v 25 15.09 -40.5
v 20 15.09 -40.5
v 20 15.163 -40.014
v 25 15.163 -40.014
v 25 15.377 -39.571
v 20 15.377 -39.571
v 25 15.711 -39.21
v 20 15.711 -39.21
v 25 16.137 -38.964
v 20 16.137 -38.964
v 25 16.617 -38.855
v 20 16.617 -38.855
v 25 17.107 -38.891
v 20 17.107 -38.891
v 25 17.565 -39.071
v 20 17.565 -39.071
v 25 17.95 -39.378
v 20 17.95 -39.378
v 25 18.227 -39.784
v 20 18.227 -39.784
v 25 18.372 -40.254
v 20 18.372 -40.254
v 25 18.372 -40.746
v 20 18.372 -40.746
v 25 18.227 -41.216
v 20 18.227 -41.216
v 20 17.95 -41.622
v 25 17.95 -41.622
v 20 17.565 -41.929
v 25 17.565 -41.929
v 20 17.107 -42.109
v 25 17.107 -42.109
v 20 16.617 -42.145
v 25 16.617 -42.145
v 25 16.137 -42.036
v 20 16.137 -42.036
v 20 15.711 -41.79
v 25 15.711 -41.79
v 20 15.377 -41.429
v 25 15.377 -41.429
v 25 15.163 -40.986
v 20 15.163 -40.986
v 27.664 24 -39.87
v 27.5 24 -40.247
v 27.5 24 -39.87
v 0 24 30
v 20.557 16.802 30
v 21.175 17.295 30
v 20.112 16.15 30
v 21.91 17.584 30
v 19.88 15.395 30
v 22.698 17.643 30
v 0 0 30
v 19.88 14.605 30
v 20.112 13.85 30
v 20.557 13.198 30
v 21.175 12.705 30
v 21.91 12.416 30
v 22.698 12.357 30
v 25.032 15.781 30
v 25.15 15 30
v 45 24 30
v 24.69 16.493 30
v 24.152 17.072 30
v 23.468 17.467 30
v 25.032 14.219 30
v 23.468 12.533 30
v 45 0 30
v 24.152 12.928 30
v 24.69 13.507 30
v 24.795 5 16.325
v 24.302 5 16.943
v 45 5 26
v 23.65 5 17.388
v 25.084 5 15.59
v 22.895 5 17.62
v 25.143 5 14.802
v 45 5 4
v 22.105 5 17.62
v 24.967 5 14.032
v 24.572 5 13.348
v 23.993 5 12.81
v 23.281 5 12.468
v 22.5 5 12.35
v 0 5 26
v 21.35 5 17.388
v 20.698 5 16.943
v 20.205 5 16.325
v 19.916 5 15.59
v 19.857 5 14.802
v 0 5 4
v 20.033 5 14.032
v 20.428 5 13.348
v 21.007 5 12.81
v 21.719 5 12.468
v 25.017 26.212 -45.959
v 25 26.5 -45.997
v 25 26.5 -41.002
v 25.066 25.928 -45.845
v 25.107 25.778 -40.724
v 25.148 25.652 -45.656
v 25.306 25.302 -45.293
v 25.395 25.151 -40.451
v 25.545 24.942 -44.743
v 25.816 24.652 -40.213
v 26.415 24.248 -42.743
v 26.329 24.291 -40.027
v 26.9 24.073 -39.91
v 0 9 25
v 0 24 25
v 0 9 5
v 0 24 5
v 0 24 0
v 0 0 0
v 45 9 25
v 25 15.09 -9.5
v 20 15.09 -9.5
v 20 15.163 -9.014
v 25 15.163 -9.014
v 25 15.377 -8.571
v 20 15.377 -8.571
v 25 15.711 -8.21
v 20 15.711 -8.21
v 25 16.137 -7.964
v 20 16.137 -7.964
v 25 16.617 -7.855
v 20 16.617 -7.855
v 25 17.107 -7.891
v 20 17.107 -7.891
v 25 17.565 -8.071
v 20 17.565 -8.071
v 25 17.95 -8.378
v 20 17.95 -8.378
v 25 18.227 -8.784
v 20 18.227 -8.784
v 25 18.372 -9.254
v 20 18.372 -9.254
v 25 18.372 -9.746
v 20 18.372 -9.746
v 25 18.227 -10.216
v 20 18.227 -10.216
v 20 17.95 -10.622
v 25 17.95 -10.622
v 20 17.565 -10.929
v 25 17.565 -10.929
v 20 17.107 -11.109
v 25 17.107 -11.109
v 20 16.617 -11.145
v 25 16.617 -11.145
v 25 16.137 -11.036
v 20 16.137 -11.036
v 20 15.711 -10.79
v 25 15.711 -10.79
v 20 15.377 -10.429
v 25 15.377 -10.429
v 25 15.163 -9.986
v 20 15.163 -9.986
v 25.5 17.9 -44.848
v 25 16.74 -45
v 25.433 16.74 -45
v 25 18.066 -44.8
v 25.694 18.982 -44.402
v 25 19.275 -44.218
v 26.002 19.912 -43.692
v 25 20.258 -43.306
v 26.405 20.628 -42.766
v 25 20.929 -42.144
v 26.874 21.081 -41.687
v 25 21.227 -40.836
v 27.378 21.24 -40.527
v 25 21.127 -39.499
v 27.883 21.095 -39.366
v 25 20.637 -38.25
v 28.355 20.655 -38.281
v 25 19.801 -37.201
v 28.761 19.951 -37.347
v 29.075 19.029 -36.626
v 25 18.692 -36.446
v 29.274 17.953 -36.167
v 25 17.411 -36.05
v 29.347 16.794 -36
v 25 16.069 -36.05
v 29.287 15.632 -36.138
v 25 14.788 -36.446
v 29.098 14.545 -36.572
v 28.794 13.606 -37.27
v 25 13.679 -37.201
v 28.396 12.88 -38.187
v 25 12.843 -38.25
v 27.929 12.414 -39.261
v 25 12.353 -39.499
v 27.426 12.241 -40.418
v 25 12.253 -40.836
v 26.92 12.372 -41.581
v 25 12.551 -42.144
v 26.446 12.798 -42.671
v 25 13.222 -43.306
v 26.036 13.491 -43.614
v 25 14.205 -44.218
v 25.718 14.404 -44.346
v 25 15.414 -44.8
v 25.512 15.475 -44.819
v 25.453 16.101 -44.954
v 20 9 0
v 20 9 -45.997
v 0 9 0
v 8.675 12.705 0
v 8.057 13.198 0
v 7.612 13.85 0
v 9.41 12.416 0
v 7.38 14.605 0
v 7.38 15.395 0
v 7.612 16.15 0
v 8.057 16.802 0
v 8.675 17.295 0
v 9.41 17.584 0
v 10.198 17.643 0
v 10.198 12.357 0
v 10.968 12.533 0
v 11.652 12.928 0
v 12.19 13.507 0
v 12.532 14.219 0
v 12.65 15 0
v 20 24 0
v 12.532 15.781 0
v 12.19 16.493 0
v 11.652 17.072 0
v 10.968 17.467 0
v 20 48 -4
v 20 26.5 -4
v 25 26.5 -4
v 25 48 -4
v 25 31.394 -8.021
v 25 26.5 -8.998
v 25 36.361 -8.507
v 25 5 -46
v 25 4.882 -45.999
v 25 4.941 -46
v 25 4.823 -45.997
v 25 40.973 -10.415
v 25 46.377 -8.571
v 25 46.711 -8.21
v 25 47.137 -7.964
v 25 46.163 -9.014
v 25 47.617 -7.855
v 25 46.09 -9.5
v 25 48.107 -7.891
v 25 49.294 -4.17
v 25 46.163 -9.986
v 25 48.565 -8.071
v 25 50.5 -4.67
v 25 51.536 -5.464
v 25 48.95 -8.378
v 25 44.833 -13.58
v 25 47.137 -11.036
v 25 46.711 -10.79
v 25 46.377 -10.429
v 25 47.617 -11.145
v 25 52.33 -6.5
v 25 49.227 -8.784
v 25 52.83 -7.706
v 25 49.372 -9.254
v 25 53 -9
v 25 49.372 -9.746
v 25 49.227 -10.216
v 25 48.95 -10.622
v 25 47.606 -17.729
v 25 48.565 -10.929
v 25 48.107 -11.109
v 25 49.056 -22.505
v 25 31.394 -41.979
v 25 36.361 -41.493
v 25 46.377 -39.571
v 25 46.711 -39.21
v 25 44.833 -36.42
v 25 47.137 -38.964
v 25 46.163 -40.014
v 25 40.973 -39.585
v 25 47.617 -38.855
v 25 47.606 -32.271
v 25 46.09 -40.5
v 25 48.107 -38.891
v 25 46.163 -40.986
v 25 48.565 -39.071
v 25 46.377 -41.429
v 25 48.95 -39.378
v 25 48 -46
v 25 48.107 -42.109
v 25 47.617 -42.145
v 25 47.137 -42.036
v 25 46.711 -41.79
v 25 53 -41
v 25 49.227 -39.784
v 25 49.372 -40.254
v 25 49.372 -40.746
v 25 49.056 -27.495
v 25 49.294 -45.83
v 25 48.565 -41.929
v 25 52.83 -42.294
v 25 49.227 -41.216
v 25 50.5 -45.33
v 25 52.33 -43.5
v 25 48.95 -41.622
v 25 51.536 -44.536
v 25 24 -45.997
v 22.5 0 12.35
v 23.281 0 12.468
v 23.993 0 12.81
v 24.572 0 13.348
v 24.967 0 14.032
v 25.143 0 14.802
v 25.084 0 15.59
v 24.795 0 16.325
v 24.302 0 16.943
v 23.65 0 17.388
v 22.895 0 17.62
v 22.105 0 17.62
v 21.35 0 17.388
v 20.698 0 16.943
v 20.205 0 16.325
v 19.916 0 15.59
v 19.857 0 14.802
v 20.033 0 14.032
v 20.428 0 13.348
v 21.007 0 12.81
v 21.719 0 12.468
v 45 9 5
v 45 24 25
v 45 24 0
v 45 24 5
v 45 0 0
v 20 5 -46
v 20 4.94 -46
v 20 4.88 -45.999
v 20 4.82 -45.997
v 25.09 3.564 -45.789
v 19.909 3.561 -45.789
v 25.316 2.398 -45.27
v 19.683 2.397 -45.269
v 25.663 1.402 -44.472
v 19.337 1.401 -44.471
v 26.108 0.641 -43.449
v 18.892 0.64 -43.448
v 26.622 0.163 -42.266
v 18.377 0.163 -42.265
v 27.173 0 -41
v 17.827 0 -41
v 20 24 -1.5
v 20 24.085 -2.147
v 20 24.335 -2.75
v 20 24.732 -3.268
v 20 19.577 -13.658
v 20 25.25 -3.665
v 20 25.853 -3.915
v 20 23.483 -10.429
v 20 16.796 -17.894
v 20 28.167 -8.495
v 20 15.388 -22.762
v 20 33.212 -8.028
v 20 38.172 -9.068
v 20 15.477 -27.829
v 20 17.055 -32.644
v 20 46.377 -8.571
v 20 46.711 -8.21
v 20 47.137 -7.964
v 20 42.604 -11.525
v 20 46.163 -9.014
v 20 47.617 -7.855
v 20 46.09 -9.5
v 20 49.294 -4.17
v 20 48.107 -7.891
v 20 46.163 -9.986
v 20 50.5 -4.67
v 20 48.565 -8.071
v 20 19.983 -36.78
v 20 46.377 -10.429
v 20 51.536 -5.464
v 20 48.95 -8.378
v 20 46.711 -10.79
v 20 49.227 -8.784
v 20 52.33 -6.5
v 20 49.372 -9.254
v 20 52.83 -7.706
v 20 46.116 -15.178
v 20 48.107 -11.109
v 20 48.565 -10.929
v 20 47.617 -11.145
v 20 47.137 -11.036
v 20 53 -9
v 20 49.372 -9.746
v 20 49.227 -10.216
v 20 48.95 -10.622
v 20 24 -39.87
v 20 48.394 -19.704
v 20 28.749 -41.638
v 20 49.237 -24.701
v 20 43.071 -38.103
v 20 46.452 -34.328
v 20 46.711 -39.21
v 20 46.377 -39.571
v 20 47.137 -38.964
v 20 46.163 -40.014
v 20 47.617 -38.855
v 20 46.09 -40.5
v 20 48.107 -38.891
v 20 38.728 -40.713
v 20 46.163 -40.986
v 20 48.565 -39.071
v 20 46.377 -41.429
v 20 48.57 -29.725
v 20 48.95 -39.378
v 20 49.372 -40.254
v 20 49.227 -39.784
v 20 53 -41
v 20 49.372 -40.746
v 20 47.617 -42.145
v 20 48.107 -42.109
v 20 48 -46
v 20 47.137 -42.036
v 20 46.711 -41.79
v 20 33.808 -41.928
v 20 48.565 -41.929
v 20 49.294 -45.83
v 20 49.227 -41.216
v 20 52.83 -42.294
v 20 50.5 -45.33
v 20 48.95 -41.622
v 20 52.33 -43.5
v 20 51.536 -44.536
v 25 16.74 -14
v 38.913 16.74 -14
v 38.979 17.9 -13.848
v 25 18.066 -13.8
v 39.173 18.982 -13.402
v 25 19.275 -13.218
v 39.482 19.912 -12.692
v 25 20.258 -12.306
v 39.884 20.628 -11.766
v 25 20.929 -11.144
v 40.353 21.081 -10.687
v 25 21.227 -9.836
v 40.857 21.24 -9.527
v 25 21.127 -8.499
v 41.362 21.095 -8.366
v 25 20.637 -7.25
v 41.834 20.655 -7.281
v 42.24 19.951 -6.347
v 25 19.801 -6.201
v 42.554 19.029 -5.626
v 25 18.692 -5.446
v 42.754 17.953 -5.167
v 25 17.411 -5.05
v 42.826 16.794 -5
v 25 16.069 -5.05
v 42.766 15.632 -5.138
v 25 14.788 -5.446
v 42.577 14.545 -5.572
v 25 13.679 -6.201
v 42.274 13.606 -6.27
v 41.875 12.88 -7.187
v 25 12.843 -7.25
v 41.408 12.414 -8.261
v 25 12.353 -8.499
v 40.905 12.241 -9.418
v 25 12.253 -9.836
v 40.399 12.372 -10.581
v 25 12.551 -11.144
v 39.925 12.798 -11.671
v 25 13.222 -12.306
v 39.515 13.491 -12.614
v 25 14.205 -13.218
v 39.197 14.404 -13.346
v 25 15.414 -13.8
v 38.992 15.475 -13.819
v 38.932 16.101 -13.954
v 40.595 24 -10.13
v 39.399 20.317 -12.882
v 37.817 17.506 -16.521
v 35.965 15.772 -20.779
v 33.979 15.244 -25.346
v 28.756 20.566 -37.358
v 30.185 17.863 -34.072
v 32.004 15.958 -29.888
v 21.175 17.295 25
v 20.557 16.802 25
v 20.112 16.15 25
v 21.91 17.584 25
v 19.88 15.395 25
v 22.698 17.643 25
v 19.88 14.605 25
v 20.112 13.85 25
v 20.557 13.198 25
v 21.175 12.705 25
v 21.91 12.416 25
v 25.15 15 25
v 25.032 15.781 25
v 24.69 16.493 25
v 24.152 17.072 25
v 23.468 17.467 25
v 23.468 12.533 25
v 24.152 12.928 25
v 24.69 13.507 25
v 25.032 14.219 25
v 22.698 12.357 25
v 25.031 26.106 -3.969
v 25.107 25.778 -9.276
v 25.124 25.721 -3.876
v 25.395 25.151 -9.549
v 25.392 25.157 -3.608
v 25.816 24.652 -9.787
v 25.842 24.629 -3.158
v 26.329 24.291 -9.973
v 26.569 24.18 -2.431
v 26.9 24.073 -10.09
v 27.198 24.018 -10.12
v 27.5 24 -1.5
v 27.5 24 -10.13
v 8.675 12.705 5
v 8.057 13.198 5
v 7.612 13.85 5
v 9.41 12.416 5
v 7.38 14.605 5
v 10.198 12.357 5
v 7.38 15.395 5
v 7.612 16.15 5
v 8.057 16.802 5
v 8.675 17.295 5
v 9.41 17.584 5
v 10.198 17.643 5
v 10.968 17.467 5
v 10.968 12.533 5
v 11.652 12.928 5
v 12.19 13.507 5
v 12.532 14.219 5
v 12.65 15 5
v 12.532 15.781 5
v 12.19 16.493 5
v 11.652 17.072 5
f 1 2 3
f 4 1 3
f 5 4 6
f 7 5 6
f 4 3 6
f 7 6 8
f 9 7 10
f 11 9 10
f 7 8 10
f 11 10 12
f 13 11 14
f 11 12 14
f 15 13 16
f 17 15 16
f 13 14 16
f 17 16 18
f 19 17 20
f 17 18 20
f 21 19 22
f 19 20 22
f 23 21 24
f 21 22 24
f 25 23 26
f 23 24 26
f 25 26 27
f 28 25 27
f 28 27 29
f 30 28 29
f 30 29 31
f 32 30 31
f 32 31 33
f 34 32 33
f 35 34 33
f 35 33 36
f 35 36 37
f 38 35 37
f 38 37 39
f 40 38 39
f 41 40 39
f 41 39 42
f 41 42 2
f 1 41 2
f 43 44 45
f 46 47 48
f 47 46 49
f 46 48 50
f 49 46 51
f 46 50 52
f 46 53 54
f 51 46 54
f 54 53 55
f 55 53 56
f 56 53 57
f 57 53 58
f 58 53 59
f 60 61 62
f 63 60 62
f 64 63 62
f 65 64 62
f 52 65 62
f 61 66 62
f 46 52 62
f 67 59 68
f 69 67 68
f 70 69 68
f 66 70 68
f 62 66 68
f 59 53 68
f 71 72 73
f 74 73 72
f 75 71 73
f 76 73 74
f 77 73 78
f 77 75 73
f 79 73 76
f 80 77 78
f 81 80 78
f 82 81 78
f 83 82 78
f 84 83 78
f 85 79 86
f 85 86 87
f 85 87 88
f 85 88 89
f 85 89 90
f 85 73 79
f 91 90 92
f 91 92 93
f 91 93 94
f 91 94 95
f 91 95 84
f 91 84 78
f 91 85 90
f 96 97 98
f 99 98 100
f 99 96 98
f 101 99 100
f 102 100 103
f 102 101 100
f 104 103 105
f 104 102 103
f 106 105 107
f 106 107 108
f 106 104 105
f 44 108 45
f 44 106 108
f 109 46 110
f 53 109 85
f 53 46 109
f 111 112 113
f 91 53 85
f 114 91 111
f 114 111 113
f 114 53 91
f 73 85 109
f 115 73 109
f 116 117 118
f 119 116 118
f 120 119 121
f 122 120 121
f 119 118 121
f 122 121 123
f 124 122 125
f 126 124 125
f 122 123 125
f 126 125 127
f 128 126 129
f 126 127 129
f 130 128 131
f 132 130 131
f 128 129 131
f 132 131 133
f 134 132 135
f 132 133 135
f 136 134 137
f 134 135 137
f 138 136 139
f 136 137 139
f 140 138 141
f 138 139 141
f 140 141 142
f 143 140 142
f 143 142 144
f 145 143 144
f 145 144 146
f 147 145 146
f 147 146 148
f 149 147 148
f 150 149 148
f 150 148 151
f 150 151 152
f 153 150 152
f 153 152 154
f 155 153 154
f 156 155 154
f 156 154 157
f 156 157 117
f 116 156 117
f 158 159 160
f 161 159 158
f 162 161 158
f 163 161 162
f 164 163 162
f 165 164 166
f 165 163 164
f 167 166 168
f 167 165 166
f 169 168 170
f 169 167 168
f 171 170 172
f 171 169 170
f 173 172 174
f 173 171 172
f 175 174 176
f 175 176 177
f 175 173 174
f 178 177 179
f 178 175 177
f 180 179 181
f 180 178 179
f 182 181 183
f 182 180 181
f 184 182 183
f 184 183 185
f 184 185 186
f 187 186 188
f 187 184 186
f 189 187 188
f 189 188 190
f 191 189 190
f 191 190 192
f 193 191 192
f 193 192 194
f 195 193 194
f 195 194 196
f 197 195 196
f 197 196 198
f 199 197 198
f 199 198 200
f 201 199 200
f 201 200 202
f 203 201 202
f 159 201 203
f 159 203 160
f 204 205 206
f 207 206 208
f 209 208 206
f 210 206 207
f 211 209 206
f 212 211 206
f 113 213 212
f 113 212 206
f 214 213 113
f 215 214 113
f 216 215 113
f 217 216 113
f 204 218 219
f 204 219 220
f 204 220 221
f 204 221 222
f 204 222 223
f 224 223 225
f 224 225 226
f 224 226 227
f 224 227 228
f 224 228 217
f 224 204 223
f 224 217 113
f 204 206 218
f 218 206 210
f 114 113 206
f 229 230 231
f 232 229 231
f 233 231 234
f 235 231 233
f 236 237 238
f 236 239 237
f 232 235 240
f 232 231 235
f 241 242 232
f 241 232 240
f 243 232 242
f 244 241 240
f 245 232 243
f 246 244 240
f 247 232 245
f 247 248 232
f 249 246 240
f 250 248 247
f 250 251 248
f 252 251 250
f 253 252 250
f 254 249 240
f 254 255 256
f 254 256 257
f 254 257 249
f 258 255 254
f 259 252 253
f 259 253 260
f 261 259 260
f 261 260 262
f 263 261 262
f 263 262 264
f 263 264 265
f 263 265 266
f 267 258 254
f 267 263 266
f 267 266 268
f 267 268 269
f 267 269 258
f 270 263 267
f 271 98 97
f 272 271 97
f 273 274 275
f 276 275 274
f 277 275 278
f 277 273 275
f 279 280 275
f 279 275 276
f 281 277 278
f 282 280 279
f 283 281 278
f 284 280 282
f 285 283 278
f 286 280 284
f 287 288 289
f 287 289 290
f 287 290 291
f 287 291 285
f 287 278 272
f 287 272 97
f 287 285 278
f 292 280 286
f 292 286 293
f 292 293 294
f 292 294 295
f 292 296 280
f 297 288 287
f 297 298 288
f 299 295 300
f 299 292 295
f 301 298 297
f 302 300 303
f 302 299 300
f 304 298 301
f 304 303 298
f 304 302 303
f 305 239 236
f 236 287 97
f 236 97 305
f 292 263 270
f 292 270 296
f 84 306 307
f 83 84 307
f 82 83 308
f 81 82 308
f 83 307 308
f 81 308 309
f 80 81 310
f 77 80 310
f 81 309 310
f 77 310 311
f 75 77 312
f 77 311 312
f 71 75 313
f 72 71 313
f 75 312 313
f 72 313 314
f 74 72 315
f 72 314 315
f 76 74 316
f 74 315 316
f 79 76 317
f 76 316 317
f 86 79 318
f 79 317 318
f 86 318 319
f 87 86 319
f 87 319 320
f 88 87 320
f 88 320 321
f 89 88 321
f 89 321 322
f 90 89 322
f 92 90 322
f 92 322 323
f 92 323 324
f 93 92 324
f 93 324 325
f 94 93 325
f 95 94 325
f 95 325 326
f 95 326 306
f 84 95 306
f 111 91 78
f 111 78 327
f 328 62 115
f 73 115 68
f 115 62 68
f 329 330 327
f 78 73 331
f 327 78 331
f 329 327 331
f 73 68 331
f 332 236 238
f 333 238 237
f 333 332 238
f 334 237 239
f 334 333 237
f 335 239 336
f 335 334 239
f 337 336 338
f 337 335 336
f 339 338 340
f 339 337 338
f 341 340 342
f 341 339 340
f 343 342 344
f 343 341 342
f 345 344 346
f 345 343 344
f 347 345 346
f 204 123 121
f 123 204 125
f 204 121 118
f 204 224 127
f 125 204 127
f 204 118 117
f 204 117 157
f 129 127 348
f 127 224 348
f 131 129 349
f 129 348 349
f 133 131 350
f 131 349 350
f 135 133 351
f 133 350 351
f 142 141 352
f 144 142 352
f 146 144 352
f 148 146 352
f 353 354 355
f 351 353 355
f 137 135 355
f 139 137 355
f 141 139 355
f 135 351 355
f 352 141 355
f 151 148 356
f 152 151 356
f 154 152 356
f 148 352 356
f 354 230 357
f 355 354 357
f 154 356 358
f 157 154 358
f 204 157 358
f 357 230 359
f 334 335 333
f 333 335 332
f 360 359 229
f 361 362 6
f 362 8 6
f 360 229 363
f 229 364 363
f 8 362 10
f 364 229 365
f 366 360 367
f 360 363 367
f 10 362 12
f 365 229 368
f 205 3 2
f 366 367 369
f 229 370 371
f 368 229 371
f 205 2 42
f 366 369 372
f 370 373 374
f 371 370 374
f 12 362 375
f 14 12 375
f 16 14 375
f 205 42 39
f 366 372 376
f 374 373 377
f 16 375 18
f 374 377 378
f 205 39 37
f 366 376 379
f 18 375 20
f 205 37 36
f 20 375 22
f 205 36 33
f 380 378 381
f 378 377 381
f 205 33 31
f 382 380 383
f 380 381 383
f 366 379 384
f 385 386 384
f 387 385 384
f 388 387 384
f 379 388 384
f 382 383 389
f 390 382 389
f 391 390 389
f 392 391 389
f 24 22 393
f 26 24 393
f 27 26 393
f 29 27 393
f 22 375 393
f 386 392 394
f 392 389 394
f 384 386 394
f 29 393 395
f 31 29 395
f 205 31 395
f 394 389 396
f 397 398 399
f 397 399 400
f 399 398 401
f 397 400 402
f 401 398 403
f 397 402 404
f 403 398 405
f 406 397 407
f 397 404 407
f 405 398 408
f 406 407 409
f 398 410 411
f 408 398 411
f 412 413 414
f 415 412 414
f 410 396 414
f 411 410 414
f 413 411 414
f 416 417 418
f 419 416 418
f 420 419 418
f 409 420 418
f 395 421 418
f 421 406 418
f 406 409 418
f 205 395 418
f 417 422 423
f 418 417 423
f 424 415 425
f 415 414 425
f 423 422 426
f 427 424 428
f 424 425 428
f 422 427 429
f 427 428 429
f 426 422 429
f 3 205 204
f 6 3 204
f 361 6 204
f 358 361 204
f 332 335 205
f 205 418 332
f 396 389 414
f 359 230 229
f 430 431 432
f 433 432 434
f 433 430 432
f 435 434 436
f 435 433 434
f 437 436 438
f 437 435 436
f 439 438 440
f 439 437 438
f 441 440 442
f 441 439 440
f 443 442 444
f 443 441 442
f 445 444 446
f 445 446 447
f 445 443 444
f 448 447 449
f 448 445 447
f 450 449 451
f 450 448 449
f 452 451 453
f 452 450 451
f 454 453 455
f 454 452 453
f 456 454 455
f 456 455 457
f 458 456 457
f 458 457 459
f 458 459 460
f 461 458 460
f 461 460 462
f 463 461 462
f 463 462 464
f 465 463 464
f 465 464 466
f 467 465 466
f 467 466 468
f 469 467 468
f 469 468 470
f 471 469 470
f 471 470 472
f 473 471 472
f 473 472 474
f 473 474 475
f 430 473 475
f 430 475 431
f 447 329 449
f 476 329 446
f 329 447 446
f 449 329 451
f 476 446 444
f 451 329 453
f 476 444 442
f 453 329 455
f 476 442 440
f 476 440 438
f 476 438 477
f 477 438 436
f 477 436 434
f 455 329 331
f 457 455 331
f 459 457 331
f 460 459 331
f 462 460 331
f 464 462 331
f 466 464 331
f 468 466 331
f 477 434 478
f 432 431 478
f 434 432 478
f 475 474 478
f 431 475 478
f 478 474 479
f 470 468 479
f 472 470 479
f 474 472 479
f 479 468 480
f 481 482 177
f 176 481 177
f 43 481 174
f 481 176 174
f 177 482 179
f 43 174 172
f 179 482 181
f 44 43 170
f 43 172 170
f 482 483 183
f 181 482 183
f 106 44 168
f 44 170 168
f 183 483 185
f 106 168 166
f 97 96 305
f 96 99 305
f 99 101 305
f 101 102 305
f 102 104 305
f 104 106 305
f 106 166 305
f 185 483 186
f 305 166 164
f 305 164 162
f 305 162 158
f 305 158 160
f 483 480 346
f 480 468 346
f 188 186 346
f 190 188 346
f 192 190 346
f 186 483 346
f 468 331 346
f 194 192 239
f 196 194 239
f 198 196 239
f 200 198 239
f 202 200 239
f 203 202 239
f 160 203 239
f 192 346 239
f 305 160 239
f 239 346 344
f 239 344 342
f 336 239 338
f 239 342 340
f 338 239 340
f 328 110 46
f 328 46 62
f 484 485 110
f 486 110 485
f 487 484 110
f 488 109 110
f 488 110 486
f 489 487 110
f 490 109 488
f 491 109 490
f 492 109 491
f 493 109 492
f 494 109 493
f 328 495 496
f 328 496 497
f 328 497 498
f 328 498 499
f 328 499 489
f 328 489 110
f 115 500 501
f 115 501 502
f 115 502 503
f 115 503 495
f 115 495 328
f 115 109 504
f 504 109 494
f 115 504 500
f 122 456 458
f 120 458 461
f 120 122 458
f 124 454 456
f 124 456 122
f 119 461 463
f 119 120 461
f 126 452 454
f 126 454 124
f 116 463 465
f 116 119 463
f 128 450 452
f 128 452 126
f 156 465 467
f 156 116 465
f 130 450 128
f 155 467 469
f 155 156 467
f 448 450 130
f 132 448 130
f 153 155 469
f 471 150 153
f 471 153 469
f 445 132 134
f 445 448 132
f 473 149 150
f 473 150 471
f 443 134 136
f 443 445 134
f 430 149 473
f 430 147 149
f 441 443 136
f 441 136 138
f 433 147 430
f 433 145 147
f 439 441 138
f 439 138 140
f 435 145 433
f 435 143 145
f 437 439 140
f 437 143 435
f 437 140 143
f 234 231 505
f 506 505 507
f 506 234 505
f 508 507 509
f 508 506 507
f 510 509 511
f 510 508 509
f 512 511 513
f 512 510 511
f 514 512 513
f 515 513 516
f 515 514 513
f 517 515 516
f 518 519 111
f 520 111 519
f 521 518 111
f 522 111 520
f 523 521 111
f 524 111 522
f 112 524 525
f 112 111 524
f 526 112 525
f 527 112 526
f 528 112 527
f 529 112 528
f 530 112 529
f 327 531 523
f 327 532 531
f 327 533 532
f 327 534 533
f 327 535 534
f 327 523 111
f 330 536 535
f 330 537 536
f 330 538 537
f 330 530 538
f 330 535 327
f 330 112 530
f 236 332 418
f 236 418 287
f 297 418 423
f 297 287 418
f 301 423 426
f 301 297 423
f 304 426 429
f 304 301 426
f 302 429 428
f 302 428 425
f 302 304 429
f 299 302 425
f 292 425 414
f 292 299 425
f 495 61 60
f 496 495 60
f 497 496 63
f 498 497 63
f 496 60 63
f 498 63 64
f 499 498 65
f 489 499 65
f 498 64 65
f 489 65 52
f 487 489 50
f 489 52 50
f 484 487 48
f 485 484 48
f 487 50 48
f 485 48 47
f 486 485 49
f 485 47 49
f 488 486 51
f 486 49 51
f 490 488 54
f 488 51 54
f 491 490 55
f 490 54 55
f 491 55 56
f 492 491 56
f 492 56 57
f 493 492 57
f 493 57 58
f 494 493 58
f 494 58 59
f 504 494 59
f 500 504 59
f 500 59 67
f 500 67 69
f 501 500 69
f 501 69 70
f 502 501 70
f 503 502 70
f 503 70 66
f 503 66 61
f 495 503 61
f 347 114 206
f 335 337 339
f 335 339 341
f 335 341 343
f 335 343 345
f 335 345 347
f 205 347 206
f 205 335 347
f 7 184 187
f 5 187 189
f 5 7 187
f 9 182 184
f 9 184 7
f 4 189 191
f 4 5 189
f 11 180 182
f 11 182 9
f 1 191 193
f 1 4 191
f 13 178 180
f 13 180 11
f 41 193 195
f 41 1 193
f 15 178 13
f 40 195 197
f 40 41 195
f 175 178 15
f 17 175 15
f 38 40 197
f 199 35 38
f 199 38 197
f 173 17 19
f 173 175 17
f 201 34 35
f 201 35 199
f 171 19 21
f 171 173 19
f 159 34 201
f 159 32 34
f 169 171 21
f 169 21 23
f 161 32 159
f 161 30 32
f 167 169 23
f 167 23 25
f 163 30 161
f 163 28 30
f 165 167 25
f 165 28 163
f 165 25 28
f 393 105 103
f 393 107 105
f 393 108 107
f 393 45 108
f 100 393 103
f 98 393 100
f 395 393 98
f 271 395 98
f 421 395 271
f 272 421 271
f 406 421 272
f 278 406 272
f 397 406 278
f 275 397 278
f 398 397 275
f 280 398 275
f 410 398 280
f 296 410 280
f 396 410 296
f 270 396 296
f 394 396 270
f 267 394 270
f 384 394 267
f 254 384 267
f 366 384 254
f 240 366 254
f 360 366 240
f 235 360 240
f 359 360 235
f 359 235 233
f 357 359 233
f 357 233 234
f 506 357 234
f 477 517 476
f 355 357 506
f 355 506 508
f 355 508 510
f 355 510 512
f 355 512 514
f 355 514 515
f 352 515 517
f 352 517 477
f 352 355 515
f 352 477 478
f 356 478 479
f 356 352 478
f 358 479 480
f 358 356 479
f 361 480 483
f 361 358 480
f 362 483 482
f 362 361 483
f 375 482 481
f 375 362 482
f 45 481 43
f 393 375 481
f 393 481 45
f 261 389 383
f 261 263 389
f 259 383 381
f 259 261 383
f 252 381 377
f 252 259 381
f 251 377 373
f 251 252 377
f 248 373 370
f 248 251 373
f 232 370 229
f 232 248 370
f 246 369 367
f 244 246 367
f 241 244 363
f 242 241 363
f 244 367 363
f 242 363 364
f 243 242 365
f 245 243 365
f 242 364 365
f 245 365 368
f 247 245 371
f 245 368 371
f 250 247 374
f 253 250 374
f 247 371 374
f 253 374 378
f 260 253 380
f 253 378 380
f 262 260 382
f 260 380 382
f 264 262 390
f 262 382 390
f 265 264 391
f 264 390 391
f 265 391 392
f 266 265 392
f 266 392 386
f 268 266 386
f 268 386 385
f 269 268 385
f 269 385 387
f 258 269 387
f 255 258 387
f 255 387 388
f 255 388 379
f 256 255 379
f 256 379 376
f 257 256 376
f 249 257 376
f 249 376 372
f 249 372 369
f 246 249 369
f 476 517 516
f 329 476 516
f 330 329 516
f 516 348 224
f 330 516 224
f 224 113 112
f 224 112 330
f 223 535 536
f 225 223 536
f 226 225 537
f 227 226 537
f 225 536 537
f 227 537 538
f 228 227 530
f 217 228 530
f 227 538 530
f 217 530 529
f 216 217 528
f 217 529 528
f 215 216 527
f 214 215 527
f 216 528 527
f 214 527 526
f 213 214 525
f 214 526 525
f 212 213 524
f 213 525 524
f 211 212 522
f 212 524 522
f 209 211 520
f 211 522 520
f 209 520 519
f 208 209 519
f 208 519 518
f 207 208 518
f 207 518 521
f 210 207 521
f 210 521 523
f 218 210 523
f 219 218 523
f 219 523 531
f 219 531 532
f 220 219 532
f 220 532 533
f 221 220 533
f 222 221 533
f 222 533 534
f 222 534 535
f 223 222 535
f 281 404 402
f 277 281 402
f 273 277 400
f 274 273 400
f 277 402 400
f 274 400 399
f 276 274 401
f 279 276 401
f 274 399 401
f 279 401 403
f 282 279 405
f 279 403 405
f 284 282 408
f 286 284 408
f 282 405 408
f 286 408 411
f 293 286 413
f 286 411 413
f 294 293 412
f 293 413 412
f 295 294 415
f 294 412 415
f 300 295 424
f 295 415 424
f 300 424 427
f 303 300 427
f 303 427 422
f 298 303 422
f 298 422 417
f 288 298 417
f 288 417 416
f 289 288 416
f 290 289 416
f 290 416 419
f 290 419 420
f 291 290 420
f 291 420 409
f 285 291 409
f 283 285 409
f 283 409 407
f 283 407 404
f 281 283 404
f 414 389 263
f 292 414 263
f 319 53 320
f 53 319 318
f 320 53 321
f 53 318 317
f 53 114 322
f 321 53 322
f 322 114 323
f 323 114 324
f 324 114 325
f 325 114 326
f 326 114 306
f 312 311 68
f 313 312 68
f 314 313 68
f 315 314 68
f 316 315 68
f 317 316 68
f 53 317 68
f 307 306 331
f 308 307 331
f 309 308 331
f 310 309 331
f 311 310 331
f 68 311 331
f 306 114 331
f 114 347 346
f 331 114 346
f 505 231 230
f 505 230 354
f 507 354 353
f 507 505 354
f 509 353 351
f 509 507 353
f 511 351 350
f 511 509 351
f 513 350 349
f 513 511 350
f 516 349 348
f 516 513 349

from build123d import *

# Parameters (mm, degrees)
SKETCH1_W               = 45
SKETCH1_H               = 24
BOSS_EXTRUDE1_DEPTH     = 5
SKETCH2_W               = 5
SKETCH2_H               = 24
BOSS_EXTRUDE2_DEPTH     = 46
SKETCH3_W               = 45
SKETCH3_H               = 5
BOSS_EXTRUDE3_DEPTH     = 20
CHAMFER2_SIZE           = 45.996850945
CHAMFER2_SIZE_2         = 20
CHAMFER3_SIZE2          = 45.996850945
CHAMFER3_SIZE           = 20
SKETCH4_W               = 5
SKETCH4_H               = 42
BOSS_EXTRUDE4_DEPTH     = 29
CUT_EXTRUDE1_DEPTH      = 75.498322129
CUT_EXTRUDE1_DEPTH_BACK = 75.498322129
SKETCH6_R               = 17
SKETCH7_W               = 46
SKETCH7_H               = 44
CUT_EXTRUDE2_DEPTH      = 75.498322129
SKETCH8_R               = 1.65
CUT_EXTRUDE3_DEPTH      = 75.498322129
SKETCH9_R               = 4.5
CUT_EXTRUDE4_DEPTH      = 75.498322129
FILLET1_R               = 5
SKETCH10_R              = 2.65
CUT_EXTRUDE5_DEPTH      = 10
SKETCH11_R              = 2.65
CUT_EXTRUDE6_DEPTH      = 10
SKETCH12_W              = 45
SKETCH12_H              = 5
BOSS_EXTRUDE5_DEPTH     = 24
SKETCH13_R              = 2.65
CUT_EXTRUDE7_DEPTH      = 10
CUT_EXTRUDE8_DEPTH      = 84.366660003
CUT_EXTRUDE8_DEPTH_BACK = 84.366660003
FILLET2_R               = 2.5


# Some blends are built 0.0001 mm under size
with BuildPart() as part:
    # Sketch1 → Boss-Extrude1 (new body)
    with BuildSketch(Plane.XY):
        with Locations((22.5, 12)):
            Rectangle(SKETCH1_W, SKETCH1_H)
    extrude(amount=BOSS_EXTRUDE1_DEPTH)

    # Sketch2 → Boss-Extrude2 (add)
    with BuildSketch(Plane(origin=(0, 0, 0), x_dir=(-1, 0, 0), z_dir=(0, 0, -1))):
        with Locations((-22.5, 12)):
            Rectangle(SKETCH2_W, SKETCH2_H)
    extrude(amount=BOSS_EXTRUDE2_DEPTH)

    # Sketch3 → Boss-Extrude3 (add)
    with BuildSketch(Plane.XY.offset(5)):
        with Locations((22.5, 2.5)):
            Rectangle(SKETCH3_W, SKETCH3_H)
    extrude(amount=BOSS_EXTRUDE3_DEPTH)

    # Chamfer2
    # the kernel refuses this chamfer: 45.996850945, 20 mm, written as the material it adds along each edge
    with BuildSketch(Plane(origin=(25, 0, 0), x_dir=(-0.015383761930769691, 0, -0.9998816629325978), z_dir=(0, 1, 0))) as chamfer2_piece_1_section:
        Polygon((CHAMFER2_SIZE * 0.999881662927, -CHAMFER2_SIZE * 0.0153837619307), (-CHAMFER2_SIZE_2 * 0.0153837619308, -CHAMFER2_SIZE_2 * 0.999881662933), (0, 0), align=None)
    chamfer2_piece_1 = extrude(amount=24, mode=Mode.PRIVATE)
    chamfer2_piece_1 = split(chamfer2_piece_1, bisect_by=Plane(origin=(45, 12, -15.645189054), z_dir=(-1, 0, 0)), keep=Keep.TOP, mode=Mode.PRIVATE)
    add(chamfer2_piece_1)

    # Chamfer3
    chamfer3_edges = [part.edges().sort_by_distance(p)[0] for p in [
        (20, 12, 0),
    ]]
    chamfer3_side = [part.faces().sort_by_distance(p)[0] for p in [
        (19.6, 12, 0),
    ]]
    chamfer(chamfer3_edges, length=CHAMFER3_SIZE - 0.0001, length2=CHAMFER3_SIZE2 - 0.0001, reference=chamfer3_side[0])  # a hair under: the kernel refuses the full size

    # Sketch4 → Boss-Extrude4 (add)
    with BuildSketch(Plane(origin=(0, 24, 0), x_dir=(1, 0, 0), z_dir=(0, 1, 0))):
        with Locations((22.5, 25)):
            Rectangle(SKETCH4_W, SKETCH4_H)
    extrude(amount=BOSS_EXTRUDE4_DEPTH)

    # Sketch6 → Cut-Extrude1 (cut, two sides: drawn at the far end of the back side and taken through both)
    with BuildSketch(Plane(origin=(25, 0, 0), x_dir=(0, 0, -1), z_dir=(1, 0, 0)).offset(-CUT_EXTRUDE1_DEPTH_BACK)):
        with Locations(Location((25, 32.24, 0), (0, 0, 331.00679558))):
            Circle(SKETCH6_R)
    extrude(amount=CUT_EXTRUDE1_DEPTH + CUT_EXTRUDE1_DEPTH_BACK, mode=Mode.SUBTRACT)

    # Sketch7 → Cut-Extrude2 (cut, through all)
    with BuildSketch(Plane.ZY.offset(-20)):
        with Locations((-23, 31)):
            Rectangle(SKETCH7_W, SKETCH7_H)
    extrude(amount=CUT_EXTRUDE2_DEPTH, mode=Mode.SUBTRACT)

    # Sketch8 → Cut-Extrude3 (cut, through all)
    with BuildSketch(Plane.ZY.offset(-20)):
        with Locations(Location((-40.5, 47.74, 0), (0, 0, 270))):
            Circle(SKETCH8_R)
        with Locations(Location((-9.5, 47.74, 0), (0, 0, 270))):
            Circle(SKETCH8_R)
        with Locations(Location((-9.5, 16.74, 0), (0, 0, 270))):
            Circle(SKETCH8_R)
        with Locations(Location((-40.5, 16.74, 0), (0, 0, 270))):
            Circle(SKETCH8_R)
    extrude(amount=-CUT_EXTRUDE3_DEPTH, mode=Mode.SUBTRACT)

    # Sketch9 → Cut-Extrude4 (cut, through all)
    with BuildSketch(Plane(origin=(25, 0, 0), x_dir=(0, 0, -1), z_dir=(1, 0, 0))):
        with Locations((9.5, 16.74)):
            Circle(SKETCH9_R)
        with Locations((40.5, 16.74)):
            Circle(SKETCH9_R)
    extrude(amount=CUT_EXTRUDE4_DEPTH, mode=Mode.SUBTRACT)

    # Fillet1
    fillet1_edges = [part.edges().sort_by_distance(p)[0] for p in [
        (22.5, 0, -46),
        (22.5, 53, -4),
        (22.5, 53, -46),
    ]]
    fillet(fillet1_edges, radius=FILLET1_R)

    # Sketch10 → Cut-Extrude5 (cut)
    with BuildSketch(Plane.XZ):
        with Locations(Location((22.5, 15, 0), (0, 0, 270))):
            Circle(SKETCH10_R)
    extrude(amount=-CUT_EXTRUDE5_DEPTH, mode=Mode.SUBTRACT)

    # Sketch11 → Cut-Extrude6 (cut)
    with BuildSketch(Plane.XY.offset(5)):
        with Locations((10, 15)):
            Circle(SKETCH11_R)
    extrude(amount=-CUT_EXTRUDE6_DEPTH, mode=Mode.SUBTRACT)

    # Sketch12 → Boss-Extrude5 (add)
    with BuildSketch(Plane(origin=(0, 0, 0), x_dir=(1, 0, 0), z_dir=(0, 1, 0))):
        with Locations((22.5, -27.5)):
            Rectangle(SKETCH12_W, SKETCH12_H)
    extrude(amount=BOSS_EXTRUDE5_DEPTH)

    # Sketch13 → Cut-Extrude7 (cut)
    with BuildSketch(Plane.XY.offset(30)):
        with Locations((22.5, 15)):
            Circle(SKETCH13_R)
    extrude(amount=-CUT_EXTRUDE7_DEPTH, mode=Mode.SUBTRACT)

    # Sketch14 → Cut-Extrude8 (cut, two sides: drawn at the far end of the back side and taken through both)
    with BuildSketch(Plane(origin=(45, 0, 0), x_dir=(0, 0, -1), z_dir=(1, 0, 0)).offset(-CUT_EXTRUDE8_DEPTH_BACK)):
        Polygon((-25, 5), (-26, 5), (-25, 9), align=None)
        Polygon((-5, 5), (-4, 5), (-5, 9), align=None)
    extrude(amount=CUT_EXTRUDE8_DEPTH + CUT_EXTRUDE8_DEPTH_BACK, mode=Mode.SUBTRACT)

    # Fillet2
    # the kernel refuses this fillet: 2.5 mm, written as the material it adds along each edge
    with BuildSketch(Plane(origin=(25, 24, -4), x_dir=(0, 0, 1), z_dir=(-1, 0, 0))) as fillet2_piece_1:
        with BuildLine():
            CenterArc((FILLET2_R, FILLET2_R), FILLET2_R, 180, 90)
            Line((0, FILLET2_R), (0, 0))
            Line((0, 0), (FILLET2_R, 0))
        make_face()
    extrude(amount=5)
    with BuildSketch(Plane(origin=(25, 24, -16.380487567), x_dir=(1, 0, 0), z_dir=(0, 0, 1))) as fillet2_piece_2_section:
        with BuildLine():
            CenterArc((FILLET2_R, FILLET2_R), FILLET2_R, 180, 90)
            Line((0, FILLET2_R), (0, 0))
            Line((0, 0), (FILLET2_R, 0))
        make_face()
    fillet2_piece_2 = extrude(amount=12.380487567, mode=Mode.PRIVATE)
    fillet2_piece_2 = fillet2_piece_2 - Plane(origin=(25.580464588, 32.24, -25), x_dir=(0, -0.48470588235146506, -0.8746772019516044), z_dir=(1, 0, 0)) * Cylinder(17, 35, mode=Mode.PRIVATE)
    add(fillet2_piece_2)
    with BuildSketch(Plane(origin=(25, 24, -52.246850945), x_dir=(0, 1, 0), z_dir=(0, 0, 1))) as fillet2_piece_3_section:
        with BuildLine():
            CenterArc((FILLET2_R, -FILLET2_R), FILLET2_R, 90, 90)
            Line((0, -FILLET2_R), (0, 0))
            Line((0, 0), (FILLET2_R, 0))
        make_face()
    fillet2_piece_3 = extrude(amount=18.627338512, mode=Mode.PRIVATE)
    fillet2_piece_3 = split(fillet2_piece_3, bisect_by=Plane(origin=(25.437853411, 24.621520757, -46), z_dir=(0, 0, 1)), keep=Keep.TOP, mode=Mode.PRIVATE)
    fillet2_piece_3 = split(fillet2_piece_3, bisect_by=Plane(origin=(26.31729653, 24.621520757, -42.967276338), z_dir=(-0.9170600743850381, 0, 0.398749068925444)), keep=Keep.TOP, mode=Mode.PRIVATE)
    fillet2_piece_3 = fillet2_piece_3 - Plane(origin=(25.437853411, 32.24, -25), x_dir=(0, -0.48470588235146506, -0.8746772019516044), z_dir=(1, 0, 0)) * Cylinder(17, 48, mode=Mode.PRIVATE)
    add(fillet2_piece_3)
    with BuildSketch(Plane(origin=(25, 24, -16.380487567), x_dir=(1, 0, 0), z_dir=(0, 0, 1))) as fillet2_piece_4a_section:
        with BuildLine():
            CenterArc((FILLET2_R, FILLET2_R), FILLET2_R, 180, 90)
            Line((0, FILLET2_R), (0, 0))
            Line((0, 0), (FILLET2_R, 0))
        make_face()
    fillet2_piece_4a = extrude(amount=18.630487567, mode=Mode.PRIVATE)
    fillet2_piece_4a = split(fillet2_piece_4a, bisect_by=Plane(origin=(25.565987786, 24.565987786, -4), z_dir=(0, 0, 1)), keep=Keep.TOP, mode=Mode.PRIVATE)
    with BuildSketch(Plane(origin=(31.25, 24, -4), x_dir=(0, 0, 1), z_dir=(-1, 0, 0))) as fillet2_piece_4b_section:
        with BuildLine():
            CenterArc((FILLET2_R, FILLET2_R), FILLET2_R, 180, 90)
            Line((0, FILLET2_R), (0, 0))
            Line((0, 0), (FILLET2_R, 0))
        make_face()
    fillet2_piece_4b = extrude(amount=11.25, mode=Mode.PRIVATE)
    fillet2_piece_4b = split(fillet2_piece_4b, bisect_by=Plane(origin=(25, 24.565987786, -3.434012214), z_dir=(1, 0, 0)), keep=Keep.TOP, mode=Mode.PRIVATE)
    fillet2_piece_4 = fillet2_piece_4a & fillet2_piece_4b
    add(fillet2_piece_4)


solid = part.part
